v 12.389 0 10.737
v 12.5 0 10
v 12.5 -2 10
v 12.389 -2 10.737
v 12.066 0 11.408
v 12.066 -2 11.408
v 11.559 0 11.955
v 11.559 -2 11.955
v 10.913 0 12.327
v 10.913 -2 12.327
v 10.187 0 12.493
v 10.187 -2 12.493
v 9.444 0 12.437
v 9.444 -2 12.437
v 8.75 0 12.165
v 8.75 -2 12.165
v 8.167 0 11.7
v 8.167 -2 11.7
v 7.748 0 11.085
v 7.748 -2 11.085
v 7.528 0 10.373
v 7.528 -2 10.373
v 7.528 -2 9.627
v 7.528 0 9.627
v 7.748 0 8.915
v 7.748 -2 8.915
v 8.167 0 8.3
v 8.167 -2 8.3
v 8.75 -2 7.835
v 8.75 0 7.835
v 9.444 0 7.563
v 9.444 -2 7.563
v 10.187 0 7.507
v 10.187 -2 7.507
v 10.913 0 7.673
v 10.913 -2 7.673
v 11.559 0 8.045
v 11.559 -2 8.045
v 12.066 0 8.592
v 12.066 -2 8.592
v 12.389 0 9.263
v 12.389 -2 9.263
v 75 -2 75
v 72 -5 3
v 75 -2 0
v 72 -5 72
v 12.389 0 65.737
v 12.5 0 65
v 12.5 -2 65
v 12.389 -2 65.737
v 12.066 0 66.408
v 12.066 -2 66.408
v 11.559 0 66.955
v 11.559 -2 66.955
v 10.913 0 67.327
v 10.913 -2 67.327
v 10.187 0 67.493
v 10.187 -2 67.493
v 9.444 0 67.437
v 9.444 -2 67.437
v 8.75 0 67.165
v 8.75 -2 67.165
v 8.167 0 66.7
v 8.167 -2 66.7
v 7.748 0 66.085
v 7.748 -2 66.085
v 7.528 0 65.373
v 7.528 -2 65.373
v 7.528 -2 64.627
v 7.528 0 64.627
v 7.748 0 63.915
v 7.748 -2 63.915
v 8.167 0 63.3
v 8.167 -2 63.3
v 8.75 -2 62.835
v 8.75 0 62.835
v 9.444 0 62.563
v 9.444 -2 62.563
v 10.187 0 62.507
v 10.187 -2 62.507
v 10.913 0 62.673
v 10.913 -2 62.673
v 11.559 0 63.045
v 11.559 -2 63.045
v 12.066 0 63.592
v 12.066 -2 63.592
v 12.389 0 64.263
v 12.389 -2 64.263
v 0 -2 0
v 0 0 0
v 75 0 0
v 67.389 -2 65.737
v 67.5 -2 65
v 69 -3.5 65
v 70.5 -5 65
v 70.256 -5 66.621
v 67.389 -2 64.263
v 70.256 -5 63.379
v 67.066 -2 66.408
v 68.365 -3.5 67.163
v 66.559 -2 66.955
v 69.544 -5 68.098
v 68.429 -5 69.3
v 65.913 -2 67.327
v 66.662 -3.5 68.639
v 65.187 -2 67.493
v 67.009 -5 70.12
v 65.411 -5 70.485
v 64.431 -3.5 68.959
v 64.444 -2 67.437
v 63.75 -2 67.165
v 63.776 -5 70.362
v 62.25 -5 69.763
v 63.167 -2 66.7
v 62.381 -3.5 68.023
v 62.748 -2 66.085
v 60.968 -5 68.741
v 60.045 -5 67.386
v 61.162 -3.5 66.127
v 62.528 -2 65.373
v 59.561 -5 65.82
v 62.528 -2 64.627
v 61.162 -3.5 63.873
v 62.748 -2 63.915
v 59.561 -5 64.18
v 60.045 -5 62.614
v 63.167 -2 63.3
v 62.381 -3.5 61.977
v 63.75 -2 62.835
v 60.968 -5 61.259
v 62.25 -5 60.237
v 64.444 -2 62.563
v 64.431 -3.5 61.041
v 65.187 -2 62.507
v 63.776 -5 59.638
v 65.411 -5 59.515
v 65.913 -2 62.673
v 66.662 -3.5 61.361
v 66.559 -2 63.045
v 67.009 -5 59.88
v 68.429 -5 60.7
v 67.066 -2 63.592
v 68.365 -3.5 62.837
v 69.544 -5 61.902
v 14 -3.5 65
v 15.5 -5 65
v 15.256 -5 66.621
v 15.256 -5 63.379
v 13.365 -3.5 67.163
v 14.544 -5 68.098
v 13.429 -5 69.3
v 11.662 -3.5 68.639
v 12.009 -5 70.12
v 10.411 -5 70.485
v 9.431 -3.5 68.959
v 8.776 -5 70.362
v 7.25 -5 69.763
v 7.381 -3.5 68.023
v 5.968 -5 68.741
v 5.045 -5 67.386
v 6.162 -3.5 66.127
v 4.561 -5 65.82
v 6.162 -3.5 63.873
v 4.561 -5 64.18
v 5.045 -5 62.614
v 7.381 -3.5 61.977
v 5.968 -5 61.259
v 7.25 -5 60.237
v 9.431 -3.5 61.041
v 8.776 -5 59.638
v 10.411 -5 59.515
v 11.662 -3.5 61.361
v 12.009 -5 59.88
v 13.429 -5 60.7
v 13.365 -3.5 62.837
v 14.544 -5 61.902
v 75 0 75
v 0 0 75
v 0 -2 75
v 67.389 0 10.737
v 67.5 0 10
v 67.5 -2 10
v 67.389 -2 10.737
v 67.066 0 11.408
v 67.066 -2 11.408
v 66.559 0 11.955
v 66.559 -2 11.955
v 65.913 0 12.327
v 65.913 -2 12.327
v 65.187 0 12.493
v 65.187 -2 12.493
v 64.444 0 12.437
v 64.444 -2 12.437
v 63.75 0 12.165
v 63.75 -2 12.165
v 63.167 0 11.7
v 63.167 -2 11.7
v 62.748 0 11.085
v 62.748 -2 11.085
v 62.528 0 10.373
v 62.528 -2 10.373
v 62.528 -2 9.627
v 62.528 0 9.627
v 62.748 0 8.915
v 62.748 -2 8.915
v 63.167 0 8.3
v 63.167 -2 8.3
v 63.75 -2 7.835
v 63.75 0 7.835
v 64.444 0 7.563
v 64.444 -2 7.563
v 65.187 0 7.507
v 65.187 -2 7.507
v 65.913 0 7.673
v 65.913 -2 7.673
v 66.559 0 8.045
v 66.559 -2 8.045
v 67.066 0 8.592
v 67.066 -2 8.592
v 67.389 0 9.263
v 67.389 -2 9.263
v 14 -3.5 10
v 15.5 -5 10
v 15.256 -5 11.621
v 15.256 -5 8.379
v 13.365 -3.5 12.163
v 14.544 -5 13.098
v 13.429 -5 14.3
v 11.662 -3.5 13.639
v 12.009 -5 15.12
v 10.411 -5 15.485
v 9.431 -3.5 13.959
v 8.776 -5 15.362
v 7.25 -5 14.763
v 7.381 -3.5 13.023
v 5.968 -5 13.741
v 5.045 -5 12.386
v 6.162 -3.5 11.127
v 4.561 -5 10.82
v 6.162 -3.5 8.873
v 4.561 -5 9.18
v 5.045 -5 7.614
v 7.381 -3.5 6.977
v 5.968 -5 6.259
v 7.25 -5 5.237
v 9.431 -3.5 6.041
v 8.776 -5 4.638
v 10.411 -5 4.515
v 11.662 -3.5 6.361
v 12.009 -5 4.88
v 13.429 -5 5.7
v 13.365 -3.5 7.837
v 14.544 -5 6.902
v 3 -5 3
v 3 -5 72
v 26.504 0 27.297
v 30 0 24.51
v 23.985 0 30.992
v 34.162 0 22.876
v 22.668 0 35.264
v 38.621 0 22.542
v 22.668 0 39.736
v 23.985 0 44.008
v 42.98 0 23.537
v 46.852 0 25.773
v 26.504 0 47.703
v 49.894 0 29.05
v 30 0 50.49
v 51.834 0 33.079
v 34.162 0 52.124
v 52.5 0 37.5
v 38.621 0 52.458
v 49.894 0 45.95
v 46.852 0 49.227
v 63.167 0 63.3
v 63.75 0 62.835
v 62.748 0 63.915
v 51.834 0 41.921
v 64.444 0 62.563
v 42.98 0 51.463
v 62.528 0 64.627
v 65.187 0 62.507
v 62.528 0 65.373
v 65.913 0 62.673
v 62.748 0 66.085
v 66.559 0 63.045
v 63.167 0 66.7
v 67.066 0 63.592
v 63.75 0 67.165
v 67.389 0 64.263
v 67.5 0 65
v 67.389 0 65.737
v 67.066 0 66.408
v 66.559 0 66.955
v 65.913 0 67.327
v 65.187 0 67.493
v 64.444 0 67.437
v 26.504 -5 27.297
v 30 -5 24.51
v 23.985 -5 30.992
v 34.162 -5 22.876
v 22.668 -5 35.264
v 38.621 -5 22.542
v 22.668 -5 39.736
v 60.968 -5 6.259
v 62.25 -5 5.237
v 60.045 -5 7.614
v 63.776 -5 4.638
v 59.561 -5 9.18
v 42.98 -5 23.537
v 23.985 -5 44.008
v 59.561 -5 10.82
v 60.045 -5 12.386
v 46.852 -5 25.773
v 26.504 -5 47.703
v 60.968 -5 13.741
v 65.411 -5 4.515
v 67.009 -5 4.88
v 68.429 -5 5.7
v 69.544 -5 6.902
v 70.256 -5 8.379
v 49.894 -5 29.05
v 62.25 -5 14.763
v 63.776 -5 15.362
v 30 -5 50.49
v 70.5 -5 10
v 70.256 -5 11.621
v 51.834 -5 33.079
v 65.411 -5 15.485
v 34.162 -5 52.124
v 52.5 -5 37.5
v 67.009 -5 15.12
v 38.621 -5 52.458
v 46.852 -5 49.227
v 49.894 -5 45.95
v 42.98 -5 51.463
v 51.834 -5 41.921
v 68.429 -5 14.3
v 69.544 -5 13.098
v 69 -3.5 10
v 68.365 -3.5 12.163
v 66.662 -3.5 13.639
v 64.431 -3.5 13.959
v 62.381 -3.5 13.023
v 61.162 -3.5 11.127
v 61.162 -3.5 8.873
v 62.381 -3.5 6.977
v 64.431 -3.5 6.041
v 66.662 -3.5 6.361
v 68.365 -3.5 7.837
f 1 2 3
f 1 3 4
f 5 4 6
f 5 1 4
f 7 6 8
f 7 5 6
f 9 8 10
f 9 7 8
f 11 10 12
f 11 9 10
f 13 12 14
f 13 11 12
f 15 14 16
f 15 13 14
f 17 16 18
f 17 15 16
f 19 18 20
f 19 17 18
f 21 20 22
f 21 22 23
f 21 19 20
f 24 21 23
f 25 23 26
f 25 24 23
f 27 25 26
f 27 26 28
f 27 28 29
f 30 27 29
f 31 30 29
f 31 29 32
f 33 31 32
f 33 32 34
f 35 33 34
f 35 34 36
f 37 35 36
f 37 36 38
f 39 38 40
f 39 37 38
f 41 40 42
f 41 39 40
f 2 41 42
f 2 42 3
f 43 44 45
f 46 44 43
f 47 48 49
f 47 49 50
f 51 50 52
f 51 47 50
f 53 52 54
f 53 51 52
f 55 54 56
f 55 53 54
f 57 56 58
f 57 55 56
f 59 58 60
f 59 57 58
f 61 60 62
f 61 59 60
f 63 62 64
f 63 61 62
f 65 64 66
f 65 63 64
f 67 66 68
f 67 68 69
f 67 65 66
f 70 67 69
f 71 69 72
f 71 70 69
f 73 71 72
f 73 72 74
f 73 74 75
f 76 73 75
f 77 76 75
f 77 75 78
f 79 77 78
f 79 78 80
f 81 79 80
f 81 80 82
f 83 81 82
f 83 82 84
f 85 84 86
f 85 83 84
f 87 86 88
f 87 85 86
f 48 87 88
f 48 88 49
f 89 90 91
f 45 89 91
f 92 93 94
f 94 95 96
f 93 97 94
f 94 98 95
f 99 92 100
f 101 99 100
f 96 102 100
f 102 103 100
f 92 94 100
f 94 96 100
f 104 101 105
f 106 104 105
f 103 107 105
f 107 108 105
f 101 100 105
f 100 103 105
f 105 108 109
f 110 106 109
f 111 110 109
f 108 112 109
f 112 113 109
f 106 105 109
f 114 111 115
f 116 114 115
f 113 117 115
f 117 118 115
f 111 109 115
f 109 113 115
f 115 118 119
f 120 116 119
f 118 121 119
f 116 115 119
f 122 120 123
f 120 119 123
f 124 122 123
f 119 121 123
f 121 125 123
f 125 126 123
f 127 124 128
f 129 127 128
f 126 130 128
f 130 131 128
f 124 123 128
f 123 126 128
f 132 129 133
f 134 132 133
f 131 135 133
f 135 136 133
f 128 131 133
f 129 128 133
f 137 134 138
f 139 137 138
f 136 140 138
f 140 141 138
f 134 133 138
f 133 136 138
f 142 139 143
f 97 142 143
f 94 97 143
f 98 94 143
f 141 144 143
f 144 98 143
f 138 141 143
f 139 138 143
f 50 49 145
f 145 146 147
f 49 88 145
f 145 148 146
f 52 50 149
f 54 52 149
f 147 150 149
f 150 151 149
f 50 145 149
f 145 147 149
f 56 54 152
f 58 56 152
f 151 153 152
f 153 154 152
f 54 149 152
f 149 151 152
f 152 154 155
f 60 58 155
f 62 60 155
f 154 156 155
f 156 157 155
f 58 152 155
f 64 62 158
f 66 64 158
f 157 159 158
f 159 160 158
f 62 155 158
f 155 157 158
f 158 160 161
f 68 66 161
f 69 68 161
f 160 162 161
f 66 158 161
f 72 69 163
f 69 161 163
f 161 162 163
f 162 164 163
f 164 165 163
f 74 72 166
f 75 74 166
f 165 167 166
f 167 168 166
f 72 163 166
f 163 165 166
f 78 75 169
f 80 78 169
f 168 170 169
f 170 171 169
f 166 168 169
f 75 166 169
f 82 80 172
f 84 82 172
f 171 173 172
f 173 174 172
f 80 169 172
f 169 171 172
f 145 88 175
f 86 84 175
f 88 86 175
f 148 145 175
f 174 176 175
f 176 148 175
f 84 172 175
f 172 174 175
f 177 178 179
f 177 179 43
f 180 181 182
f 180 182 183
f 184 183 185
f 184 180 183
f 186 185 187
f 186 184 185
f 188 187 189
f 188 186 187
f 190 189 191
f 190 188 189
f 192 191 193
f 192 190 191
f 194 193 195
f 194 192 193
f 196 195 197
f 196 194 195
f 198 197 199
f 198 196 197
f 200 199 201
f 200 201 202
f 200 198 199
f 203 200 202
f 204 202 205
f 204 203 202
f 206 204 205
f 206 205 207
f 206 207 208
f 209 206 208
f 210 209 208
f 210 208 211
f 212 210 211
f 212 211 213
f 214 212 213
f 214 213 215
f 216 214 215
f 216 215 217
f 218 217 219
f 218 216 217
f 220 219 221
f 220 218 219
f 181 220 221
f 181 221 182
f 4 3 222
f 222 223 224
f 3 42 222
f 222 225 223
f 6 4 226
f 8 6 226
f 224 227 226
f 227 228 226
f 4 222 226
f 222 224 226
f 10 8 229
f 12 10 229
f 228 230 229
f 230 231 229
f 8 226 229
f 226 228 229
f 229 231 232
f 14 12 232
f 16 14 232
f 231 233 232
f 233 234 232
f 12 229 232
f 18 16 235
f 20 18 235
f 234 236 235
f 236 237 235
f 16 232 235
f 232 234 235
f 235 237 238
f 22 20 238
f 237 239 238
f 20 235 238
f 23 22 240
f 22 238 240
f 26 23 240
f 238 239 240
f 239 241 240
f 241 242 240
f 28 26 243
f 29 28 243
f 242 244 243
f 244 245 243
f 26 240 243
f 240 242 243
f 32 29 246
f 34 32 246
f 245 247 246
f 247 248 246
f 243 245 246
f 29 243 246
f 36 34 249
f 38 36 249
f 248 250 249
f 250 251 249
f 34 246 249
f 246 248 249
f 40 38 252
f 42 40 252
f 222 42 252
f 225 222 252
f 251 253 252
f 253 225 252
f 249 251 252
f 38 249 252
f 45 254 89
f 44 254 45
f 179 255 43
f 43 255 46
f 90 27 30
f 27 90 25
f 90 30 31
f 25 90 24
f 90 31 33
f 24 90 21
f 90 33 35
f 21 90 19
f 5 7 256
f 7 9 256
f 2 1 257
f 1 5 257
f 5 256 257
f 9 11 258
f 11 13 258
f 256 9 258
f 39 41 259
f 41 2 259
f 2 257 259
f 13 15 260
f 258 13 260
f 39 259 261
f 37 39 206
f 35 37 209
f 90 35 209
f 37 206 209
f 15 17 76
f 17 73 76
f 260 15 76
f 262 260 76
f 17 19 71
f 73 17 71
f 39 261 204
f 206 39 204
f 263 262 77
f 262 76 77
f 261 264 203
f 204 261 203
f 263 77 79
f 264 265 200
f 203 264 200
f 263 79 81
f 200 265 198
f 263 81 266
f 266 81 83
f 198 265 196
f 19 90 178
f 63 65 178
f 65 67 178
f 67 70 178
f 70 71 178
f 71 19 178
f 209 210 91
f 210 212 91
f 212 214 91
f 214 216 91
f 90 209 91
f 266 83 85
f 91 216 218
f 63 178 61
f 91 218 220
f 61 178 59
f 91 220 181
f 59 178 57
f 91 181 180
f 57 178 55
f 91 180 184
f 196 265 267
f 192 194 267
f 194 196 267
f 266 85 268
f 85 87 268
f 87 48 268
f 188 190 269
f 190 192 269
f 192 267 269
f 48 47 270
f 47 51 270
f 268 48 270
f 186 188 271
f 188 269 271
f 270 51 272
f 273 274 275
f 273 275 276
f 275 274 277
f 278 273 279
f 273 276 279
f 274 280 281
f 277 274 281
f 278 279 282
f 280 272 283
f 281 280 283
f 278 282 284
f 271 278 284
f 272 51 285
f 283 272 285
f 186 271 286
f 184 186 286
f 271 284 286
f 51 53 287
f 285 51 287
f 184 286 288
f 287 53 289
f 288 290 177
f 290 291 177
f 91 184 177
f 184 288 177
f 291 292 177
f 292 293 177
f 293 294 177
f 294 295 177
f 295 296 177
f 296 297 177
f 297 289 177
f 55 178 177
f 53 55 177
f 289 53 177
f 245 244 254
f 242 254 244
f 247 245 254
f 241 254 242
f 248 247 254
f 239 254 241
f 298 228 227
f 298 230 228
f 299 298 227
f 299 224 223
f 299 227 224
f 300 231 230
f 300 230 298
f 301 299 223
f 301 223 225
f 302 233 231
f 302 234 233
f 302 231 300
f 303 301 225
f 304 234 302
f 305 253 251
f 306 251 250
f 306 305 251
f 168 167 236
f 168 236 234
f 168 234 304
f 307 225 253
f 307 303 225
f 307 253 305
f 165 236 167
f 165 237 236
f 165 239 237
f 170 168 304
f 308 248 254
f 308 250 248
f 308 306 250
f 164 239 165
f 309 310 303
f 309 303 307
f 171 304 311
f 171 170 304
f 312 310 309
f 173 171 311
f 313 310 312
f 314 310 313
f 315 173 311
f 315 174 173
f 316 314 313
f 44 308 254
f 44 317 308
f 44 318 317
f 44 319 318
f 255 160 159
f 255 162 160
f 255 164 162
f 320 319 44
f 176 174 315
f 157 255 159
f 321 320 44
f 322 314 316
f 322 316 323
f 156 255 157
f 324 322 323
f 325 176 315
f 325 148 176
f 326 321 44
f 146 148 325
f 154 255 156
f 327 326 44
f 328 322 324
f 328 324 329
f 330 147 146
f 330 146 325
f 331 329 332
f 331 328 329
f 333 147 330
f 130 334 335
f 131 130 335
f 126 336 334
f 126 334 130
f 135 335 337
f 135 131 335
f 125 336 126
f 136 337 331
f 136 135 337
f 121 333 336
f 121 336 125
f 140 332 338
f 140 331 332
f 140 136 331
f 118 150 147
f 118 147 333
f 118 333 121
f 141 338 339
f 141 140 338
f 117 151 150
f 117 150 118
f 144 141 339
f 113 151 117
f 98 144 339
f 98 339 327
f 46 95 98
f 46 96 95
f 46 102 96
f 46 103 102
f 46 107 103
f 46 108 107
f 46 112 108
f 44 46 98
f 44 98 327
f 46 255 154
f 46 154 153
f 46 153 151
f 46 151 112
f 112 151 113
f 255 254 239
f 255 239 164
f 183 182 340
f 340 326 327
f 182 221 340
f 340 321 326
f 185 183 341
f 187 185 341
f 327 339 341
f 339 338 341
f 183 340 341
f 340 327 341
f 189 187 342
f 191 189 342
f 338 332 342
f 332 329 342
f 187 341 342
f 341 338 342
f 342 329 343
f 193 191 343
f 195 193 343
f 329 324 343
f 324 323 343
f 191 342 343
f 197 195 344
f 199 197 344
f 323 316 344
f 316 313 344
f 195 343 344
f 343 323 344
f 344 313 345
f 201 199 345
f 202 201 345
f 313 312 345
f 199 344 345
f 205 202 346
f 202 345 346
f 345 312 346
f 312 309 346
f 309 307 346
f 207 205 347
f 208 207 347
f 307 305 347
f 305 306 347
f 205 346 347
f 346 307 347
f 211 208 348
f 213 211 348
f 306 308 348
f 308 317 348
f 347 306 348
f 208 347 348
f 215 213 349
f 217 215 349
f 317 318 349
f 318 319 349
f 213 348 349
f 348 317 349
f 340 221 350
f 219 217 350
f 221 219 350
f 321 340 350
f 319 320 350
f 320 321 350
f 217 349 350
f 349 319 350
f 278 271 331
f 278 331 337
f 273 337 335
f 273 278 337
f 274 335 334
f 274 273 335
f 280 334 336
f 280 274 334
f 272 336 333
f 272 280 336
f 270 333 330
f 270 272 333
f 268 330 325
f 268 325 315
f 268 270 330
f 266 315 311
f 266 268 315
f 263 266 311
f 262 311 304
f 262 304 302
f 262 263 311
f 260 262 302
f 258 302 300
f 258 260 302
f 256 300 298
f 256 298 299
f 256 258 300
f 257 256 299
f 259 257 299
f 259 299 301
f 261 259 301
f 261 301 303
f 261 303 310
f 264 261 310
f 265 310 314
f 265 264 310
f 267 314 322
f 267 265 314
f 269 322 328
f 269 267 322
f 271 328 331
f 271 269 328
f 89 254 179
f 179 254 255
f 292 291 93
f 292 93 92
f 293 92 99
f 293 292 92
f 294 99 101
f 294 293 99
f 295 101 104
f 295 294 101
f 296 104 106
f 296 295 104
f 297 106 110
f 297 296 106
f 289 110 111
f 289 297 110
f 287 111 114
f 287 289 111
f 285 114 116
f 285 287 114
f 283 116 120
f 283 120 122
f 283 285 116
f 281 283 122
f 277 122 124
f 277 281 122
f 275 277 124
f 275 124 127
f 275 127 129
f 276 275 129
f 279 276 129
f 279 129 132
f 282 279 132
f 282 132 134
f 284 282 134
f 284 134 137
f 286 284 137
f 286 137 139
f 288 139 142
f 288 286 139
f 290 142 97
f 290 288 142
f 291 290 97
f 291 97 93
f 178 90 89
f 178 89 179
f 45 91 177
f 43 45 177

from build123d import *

# Parameters (mm, degrees)
F0_W     = 75
F0_H     = 75
F0_R     = 2.5
F0_R_2   = 15
F1_DEPTH = 5
F2_SIZE  = 3


with BuildPart() as f1:
    # F0 (on Front) → F1 (new body)
    with BuildSketch(Plane.XZ):
        with Locations((37.5, 37.5)):
            Rectangle(F0_W, F0_H)
        with Locations((10, 10)):
            Circle(F0_R, mode=Mode.SUBTRACT)
        with Locations((65, 10)):
            Circle(F0_R, mode=Mode.SUBTRACT)
        with Locations((10, 65)):
            Circle(F0_R, mode=Mode.SUBTRACT)
        with Locations((37.5, 37.5)):
            Circle(F0_R_2, mode=Mode.SUBTRACT)
        with Locations((65, 65)):
            Circle(F0_R, mode=Mode.SUBTRACT)
    extrude(amount=F1_DEPTH)

    # F2
    f2_edges = [f1.edges().sort_by_distance(p)[0] for p in [
        (75, -5, 37.5),
        (37.5, -5, 0),
        (37.5, -5, 75),
        (0, -5, 37.5),
        (7.5, -5, 65),
        (7.5, -5, 10),
        (62.5, -5, 10),
        (62.5, -5, 65),
    ]]
    chamfer(f2_edges, length=F2_SIZE)


solid = f1.part
